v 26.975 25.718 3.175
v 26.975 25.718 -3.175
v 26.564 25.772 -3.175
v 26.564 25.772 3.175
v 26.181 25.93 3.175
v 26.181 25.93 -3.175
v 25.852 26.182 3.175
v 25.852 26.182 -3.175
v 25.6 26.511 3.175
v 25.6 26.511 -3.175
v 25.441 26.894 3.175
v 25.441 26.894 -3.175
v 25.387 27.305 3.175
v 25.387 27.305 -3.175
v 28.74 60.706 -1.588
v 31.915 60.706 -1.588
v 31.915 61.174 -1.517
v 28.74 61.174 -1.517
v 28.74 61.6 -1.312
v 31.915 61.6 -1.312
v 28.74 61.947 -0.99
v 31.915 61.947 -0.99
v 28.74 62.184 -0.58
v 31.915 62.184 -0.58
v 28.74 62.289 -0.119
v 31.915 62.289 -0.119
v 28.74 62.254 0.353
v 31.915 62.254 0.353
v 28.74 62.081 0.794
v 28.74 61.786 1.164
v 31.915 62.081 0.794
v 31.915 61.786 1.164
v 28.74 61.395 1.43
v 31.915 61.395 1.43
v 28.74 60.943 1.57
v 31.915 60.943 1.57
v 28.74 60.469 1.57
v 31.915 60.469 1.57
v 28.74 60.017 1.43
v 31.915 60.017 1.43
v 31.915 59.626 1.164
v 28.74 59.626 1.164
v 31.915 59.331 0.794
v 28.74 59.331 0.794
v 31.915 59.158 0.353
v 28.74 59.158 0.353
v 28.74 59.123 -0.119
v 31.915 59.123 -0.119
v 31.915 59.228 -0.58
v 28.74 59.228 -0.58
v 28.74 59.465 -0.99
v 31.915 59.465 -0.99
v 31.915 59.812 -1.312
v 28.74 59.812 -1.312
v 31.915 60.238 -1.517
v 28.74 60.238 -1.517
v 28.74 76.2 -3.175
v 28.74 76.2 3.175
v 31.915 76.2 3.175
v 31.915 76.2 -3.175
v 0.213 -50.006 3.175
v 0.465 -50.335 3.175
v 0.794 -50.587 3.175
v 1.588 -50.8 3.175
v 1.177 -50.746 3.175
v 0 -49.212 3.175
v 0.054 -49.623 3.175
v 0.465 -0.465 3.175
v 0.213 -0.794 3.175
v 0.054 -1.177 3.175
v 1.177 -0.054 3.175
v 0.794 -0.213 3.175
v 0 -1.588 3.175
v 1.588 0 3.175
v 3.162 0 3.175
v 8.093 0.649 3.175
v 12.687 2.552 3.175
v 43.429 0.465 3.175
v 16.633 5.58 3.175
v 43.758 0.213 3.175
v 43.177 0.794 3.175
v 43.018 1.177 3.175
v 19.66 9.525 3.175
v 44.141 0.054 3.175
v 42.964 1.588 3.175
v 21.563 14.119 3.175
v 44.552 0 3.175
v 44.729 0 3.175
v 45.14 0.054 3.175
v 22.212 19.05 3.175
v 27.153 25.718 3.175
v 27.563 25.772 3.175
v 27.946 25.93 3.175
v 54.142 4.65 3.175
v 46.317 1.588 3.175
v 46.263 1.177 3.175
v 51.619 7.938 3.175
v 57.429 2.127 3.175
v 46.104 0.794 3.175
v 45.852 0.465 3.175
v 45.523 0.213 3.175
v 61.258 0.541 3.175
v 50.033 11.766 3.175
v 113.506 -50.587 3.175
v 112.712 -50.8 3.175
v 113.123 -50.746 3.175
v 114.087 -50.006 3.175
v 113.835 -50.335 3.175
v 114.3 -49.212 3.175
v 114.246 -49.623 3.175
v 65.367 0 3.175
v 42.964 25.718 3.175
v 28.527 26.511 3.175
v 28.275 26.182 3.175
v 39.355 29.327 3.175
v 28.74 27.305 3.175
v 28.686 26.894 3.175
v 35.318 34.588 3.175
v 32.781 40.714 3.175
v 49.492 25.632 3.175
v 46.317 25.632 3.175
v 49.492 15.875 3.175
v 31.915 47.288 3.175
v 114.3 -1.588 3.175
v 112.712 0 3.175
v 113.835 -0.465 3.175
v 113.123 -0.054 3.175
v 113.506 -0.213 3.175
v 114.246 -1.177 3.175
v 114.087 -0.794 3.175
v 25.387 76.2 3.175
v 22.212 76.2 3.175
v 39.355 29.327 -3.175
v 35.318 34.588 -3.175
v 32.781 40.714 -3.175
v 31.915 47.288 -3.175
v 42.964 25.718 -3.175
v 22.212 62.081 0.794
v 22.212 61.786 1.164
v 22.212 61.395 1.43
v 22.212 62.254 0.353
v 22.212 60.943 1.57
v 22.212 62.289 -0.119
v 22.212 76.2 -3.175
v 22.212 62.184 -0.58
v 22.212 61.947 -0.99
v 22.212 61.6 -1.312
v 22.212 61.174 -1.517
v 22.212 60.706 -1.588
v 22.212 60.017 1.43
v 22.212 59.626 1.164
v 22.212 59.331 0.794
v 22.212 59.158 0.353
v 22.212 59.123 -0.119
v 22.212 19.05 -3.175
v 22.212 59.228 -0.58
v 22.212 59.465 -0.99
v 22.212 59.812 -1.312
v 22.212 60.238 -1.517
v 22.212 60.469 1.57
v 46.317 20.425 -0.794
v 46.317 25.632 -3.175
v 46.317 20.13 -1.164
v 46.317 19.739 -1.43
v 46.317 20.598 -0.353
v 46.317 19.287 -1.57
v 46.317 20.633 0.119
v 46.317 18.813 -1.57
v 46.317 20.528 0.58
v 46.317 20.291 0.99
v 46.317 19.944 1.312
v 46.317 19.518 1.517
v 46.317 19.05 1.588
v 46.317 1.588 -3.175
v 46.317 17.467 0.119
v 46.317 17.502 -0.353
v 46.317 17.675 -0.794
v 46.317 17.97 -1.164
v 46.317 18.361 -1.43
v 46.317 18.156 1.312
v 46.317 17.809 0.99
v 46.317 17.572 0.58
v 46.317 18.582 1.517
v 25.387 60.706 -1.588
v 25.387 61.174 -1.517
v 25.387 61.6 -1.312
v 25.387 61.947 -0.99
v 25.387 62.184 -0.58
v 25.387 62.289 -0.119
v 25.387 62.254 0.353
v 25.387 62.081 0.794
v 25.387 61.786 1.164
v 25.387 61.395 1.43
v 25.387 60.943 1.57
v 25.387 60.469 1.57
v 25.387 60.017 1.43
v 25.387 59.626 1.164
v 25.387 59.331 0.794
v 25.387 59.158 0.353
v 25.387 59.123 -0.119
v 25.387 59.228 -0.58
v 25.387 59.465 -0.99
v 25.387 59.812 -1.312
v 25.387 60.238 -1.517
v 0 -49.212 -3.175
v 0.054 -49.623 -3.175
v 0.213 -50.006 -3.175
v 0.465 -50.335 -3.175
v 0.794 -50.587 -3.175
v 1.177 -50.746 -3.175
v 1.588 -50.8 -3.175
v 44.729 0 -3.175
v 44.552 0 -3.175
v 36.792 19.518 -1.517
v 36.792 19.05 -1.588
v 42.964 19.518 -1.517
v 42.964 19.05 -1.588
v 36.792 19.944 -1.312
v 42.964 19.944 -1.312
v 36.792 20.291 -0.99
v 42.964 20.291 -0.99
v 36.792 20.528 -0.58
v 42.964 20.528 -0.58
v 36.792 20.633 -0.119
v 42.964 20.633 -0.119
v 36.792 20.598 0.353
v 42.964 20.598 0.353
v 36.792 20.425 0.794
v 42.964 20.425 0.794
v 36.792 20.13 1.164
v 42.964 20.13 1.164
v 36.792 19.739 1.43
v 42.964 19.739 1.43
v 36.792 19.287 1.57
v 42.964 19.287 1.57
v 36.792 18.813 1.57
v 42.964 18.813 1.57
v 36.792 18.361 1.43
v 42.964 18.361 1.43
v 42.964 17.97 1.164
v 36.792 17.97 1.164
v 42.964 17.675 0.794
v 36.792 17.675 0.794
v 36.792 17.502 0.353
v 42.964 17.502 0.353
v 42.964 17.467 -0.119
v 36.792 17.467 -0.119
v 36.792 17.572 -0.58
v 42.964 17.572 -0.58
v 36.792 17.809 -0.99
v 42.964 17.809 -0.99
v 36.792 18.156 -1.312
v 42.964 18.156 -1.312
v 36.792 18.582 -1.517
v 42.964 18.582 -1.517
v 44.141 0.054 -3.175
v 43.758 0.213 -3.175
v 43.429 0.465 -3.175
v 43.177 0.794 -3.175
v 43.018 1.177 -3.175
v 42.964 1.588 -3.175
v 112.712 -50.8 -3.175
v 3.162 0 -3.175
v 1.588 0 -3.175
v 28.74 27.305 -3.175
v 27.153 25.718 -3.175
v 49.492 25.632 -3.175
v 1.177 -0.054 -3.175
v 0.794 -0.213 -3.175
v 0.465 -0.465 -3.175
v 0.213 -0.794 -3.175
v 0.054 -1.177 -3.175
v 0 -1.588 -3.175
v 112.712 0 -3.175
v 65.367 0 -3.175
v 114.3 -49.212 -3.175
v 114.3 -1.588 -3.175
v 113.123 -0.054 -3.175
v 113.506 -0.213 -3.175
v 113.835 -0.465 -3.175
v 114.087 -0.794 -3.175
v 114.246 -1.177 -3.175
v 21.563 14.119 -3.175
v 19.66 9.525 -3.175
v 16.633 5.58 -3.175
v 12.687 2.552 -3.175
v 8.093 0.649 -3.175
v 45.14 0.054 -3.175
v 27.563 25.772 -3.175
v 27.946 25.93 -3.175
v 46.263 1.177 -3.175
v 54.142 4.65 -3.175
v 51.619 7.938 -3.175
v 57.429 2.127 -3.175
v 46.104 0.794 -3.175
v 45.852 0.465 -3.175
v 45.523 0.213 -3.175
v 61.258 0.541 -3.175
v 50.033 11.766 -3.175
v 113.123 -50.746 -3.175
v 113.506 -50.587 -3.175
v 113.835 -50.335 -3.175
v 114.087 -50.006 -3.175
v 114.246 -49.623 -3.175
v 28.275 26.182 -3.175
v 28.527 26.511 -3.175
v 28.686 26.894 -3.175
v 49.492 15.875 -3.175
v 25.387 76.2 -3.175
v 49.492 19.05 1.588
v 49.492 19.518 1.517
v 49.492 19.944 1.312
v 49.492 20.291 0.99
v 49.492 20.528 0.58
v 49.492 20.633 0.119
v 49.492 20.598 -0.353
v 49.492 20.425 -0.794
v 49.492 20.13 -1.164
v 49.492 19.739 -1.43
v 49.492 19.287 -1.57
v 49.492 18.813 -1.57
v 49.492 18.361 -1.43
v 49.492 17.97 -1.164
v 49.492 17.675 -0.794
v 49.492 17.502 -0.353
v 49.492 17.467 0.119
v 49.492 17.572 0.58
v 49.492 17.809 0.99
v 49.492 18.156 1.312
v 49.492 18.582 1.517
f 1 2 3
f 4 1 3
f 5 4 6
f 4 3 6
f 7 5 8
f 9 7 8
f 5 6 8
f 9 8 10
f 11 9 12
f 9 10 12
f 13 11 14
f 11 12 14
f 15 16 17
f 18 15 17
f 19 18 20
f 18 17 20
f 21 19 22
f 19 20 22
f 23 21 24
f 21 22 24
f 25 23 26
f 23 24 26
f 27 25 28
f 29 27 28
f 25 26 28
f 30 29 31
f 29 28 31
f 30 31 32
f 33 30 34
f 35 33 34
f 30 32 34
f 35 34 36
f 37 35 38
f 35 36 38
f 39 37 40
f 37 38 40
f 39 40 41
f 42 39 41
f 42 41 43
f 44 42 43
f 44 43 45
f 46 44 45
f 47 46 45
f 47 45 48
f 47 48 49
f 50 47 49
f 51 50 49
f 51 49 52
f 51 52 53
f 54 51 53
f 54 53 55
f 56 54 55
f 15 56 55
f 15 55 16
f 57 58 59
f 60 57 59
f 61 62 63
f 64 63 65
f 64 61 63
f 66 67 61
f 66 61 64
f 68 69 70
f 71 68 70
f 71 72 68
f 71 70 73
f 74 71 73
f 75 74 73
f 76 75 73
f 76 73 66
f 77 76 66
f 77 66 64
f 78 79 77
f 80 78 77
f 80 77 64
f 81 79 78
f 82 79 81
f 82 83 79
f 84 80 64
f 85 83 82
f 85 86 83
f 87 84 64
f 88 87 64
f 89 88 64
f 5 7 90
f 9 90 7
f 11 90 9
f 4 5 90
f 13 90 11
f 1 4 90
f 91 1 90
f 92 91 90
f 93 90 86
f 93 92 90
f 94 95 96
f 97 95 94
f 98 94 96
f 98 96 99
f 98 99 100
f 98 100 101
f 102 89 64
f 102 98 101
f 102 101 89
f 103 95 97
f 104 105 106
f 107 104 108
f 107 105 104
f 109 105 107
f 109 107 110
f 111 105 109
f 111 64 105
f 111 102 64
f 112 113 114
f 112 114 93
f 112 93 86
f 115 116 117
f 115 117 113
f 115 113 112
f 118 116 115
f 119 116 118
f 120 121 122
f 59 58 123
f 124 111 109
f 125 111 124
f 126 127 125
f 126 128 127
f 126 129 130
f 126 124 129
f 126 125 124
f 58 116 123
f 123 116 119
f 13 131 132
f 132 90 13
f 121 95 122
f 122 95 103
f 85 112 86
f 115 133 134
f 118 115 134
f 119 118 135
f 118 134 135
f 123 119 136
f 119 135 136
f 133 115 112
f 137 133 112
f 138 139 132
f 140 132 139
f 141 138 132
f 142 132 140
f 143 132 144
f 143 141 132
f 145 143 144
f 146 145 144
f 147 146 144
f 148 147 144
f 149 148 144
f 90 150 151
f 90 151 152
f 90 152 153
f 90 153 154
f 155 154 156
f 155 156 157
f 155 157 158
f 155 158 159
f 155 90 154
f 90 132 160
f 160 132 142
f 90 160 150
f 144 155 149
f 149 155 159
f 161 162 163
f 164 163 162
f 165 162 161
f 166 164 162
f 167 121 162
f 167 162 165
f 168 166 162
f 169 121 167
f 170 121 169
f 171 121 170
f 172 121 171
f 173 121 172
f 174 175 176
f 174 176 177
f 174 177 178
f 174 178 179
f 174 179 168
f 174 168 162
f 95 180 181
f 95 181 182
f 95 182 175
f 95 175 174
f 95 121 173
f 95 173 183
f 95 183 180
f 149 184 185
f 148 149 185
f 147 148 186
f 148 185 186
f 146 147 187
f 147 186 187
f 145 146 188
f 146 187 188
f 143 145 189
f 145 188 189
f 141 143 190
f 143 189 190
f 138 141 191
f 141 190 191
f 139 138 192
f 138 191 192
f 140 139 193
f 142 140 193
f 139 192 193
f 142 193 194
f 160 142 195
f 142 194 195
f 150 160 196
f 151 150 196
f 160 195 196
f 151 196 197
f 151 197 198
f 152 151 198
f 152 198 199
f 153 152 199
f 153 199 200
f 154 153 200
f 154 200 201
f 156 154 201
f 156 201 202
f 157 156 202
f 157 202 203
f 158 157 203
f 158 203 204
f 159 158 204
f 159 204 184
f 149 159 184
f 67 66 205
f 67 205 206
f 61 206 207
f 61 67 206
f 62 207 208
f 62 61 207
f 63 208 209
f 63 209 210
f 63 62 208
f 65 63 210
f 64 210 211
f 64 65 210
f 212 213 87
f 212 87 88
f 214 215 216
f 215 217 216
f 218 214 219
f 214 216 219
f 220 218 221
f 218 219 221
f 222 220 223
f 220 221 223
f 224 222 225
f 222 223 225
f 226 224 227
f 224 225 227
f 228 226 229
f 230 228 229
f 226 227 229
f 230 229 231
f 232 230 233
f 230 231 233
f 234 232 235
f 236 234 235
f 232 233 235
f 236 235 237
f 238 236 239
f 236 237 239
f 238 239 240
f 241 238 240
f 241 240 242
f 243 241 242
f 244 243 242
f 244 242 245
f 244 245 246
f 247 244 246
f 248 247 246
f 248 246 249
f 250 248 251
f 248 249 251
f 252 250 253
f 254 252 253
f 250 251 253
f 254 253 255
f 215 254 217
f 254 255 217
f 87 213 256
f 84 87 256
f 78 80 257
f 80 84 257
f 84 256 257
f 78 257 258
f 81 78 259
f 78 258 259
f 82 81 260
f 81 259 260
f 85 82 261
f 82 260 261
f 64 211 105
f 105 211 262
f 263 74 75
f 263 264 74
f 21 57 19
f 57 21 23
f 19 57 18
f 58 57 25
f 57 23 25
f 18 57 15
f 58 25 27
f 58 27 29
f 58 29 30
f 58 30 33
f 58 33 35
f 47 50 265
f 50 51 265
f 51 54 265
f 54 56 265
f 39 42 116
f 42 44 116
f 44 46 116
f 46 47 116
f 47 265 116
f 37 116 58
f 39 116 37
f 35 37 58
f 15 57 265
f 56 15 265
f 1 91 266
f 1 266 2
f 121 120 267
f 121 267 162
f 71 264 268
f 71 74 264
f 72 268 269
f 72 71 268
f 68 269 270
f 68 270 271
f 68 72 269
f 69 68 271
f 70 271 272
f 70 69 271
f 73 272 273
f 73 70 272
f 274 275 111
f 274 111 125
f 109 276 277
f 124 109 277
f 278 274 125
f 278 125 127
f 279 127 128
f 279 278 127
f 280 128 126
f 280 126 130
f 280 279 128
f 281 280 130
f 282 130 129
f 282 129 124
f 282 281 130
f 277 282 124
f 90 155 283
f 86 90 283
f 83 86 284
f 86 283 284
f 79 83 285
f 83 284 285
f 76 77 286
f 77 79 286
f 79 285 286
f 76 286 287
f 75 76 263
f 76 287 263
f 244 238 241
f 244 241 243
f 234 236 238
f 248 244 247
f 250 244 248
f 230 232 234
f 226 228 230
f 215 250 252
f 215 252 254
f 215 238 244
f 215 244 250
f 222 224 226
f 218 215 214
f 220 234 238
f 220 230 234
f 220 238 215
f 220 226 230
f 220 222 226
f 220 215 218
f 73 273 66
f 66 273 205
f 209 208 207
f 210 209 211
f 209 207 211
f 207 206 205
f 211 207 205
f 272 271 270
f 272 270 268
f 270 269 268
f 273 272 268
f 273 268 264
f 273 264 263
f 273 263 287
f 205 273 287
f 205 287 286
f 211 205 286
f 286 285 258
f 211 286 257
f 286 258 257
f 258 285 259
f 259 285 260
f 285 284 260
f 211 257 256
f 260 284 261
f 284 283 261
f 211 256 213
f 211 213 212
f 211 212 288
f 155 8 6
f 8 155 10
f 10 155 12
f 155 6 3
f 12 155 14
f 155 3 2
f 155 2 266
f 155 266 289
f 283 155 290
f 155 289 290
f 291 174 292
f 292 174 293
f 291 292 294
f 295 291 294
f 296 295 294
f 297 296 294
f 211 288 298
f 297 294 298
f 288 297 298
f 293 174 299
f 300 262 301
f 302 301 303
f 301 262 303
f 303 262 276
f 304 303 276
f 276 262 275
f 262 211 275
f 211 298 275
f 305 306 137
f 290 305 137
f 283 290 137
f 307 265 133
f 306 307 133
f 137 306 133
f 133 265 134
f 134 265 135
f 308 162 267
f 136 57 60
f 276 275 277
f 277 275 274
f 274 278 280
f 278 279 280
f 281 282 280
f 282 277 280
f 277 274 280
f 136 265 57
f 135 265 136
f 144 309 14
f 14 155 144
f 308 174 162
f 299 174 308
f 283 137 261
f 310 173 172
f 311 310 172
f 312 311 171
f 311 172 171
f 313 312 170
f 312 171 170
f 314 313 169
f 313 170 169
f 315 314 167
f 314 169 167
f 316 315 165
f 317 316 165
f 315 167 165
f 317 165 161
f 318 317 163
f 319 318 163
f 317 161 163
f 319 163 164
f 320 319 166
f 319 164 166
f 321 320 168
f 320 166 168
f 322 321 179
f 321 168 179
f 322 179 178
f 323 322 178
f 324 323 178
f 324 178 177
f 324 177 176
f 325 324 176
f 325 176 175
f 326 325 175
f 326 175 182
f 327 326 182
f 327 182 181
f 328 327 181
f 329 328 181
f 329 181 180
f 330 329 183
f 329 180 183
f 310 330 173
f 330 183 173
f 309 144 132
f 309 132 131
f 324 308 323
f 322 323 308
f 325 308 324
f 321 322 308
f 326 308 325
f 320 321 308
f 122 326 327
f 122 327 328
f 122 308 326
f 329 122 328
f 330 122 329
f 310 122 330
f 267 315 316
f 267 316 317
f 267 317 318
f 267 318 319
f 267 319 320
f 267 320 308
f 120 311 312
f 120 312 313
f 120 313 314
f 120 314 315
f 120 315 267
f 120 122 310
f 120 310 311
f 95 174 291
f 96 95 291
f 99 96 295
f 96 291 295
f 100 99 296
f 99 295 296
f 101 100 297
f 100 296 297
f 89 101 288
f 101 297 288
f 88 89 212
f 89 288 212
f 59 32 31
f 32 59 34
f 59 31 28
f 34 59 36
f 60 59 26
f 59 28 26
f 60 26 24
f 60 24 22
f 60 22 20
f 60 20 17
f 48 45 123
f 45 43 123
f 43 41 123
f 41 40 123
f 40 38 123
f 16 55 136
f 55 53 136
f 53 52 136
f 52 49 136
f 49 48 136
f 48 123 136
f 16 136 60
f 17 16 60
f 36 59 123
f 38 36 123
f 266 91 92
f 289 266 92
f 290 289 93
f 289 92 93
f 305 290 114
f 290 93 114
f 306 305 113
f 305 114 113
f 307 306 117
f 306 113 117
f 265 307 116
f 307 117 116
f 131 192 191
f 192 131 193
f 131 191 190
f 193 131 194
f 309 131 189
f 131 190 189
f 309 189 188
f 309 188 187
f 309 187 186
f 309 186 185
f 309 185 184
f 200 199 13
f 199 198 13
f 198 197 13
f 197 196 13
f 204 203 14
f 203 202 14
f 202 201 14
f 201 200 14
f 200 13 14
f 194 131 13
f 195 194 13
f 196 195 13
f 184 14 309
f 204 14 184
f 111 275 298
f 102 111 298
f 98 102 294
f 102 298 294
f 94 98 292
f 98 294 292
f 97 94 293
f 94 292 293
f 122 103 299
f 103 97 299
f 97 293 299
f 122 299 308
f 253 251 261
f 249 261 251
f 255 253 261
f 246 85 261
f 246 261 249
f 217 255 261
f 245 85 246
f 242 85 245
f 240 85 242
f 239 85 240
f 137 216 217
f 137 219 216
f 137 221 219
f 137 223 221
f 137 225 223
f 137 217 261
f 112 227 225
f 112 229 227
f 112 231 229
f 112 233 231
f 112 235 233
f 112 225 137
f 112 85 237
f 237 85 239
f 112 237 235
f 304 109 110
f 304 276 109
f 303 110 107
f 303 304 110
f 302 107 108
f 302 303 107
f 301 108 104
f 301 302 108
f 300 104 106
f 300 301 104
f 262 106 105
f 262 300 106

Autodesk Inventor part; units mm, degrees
ref_plane "YZ Plane" through (0, 0, 0) normal (1, 0, 0) x (0, 1, 0)
ref_plane "XZ Plane" through (0, 0, 0) normal (0, 1, 0) x (-1, 0, 0)
ref_plane "XY Plane" through (0, 0, 0) normal (0, 0, 1) x (1, 0, 0)
sketch "Sketch1" plane through (0, 0, 0) normal (0, 0, 1) x (1, 0, 0)
  line L0 (0, 0) -> (114.3, 0)
  line L1 (0, 0) -> (0, -50.8)
  line L2 (0, -50.8) -> (114.3, -50.8)
  line L3 (114.3, -50.8) -> (114.3, 0)
  dimension "d1" = 114.3
  dimension "d2" = 50.8
  dimension "d3" = 114.3
extrude "Extrusion1" add sketch "Sketch1" along normal blind 3.175
sketch "Sketch2" plane through (0, 0, 0) normal (0, 1, 0) x (1, 0, 0)
  line L0 (114.3, -3.175) -> (0, -3.175) projected
  line L1 (25.3873, -1.5875) -> (25.3873, 0)
  line L2 (25.3873, -3.175) -> (25.3873, -1.5875)
  line L3 (28.7401, -1.5875) -> (28.7401, -3.175)
  line L4 (28.7401, -1.5875) -> (28.7401, 0)
  line L5 (25.3873, -3.175) -> (22.2123, -3.175)
  line L6 (22.2123, -3.175) -> (22.2123, 3.175)
  line L7 (28.7401, -3.175) -> (31.9151, -3.175)
  line L8 (31.9151, -3.175) -> (31.9151, 3.175)
  line L9 (25.3873, 0) -> (25.3873, 3.175)
  line L10 (25.3873, 3.175) -> (22.2123, 3.175)
  line L11 (31.9151, 3.175) -> (28.7401, 3.175)
  line L12 (28.7401, 3.175) -> (28.7401, 0)
  point P0 (27.0637, -1.5875)
  dimension "d7" = 1.6764
  dimension "d8" = 1.6764
  dimension "d9" = 3.175
  dimension "d10" = 6.35
  dimension "d11" = 3.175
sketch "Sketch3" plane through (0, 0, 0) normal (0, 0, -1) x (-1, 0, 0)
  line L0 (-114.3, 0) -> (0, 0) projected
  line L1 (0, -50.8) -> (-114.3, -50.8) projected
  line L2 (0, 0) -> (-114.3, 0)
  line L3 (-114.3, 0) -> (-114.3, -50.8)
  line L4 (-114.3, -50.8) -> (0, -50.8)
  line L5 (0, -50.8) -> (0, 0)
extrude "Extrusion2" add sketch "Sketch3" along normal blind 3.175
extrude "Extrusion3" add sketch "Sketch2" along normal blind 76.2 contours L0 L3 L4 L12 L11 L8
extrude "Extrusion4" add sketch "Sketch2" along normal blind 76.2 contours L0 L6 L10 L9 L1 L2
sketch "Sketch4" plane through (31.9151, 0, 3.175) normal (1, 0, 0) x (0, 0, -1)
  line L0 (3.175, 0) -> (3.175, 19.05)
  circle A0 centre (3.175, 19.05) radius 1.5875
  dimension "d18" = 19.05
  dimension "d19" = 3.175
extrude "Extrusion5" cut sketch "Sketch4" along normal mid plane 50.8
sketch "Sketch5" plane through (31.9151, 0, 3.175) normal (1, 0, 0) x (0, 0, -1)
  circle A0 centre (3.175, 19.05) radius 1.5875 projected
  line L0 (3.175, 19.05) -> (3.175, 60.706)
  circle A1 centre (3.175, 60.706) radius 1.5875
  point P0 (3.175, 0)
  dimension "d22" = 41.656
  dimension "d23" = 3.175
extrude "Extrusion6" cut sketch "Sketch5" against normal blind 50.8 contours A1
sketch "Sketch6" plane through (25.3873, 0, 3.175) normal (1, 0, 0) x (0, 0, -1)
  point P0 (3.175, 0)
sketch "Sketch7" plane through (0, 0, 3.175) normal (0, 0, 1) x (1, 0, 0)
  point P0 (0, 0)
sketch "Sketch8" plane through (0, 0, 3.175) normal (0, 0, 1) x (1, 0, 0)
  line L0 (38.0873, 0) -> (41.2623, 0)
  line L1 (41.2623, 0) -> (41.2623, 22.5425)
  line L2 (38.0873, 0) -> (38.0873, 22.5425)
  line L3 (38.0873, 22.5425) -> (41.2623, 22.5425)
  line L4 (38.0873, 22.5425) -> (31.9151, 22.5425)
  line L5 (31.9151, 0) -> (31.9151, 76.2) projected
  line L6 (41.2623, 22.5425) -> (41.2623, 25.7175)
  line L7 (41.2623, 25.7175) -> (31.9151, 25.7175)
  point P0 (0, 0)
  dimension "d30" = 3.175
  dimension "d34" = 3.175
sketch "Sketch9" plane through (0, 0, 3.175) normal (0, 0, 1) x (1, 0, 0)
  line L0 (41.2623, 25.7175) -> (41.2623, 0) projected
  line L1 (31.9151, 0) -> (114.3, 0) projected
  line L2 (44.6151, 0) -> (44.6151, 25.6324)
  line L3 (44.6151, 25.6324) -> (47.7901, 25.6324)
  line L4 (47.7901, 0) -> (47.7901, 25.6324)
  line L5 (44.6151, 0) -> (47.7901, 0)
  point P0 (0, 0)
  dimension "d35" = 3.3528
  dimension "d36" = 3.175
sketch "Sketch12" plane through (0, 0, 3.175) normal (0, 0, 1) x (1, 0, 0)
  line L0 (44.6151, 0) -> (44.6151, 25.6324) projected
  line L1 (44.6151, 0) -> (46.3169, 0)
  line L2 (46.3169, 0) -> (49.4919, 0)
  line L3 (25.3873, 0) -> (114.3, 0) projected
  line L4 (49.4919, 0) -> (49.4919, 25.6324)
  line L5 (49.4919, 25.6324) -> (46.3169, 25.6324)
  line L6 (46.3169, 25.6324) -> (46.3169, 0)
  point P0 (0, 0)
  point P1 (47.7901, 0)
  point P2 (41.2623, 0)
  dimension "d44" = 1.7018
  dimension "d45" = 3.175
extrude "Extrusion11" add sketch "Sketch12" against normal blind 6.35
sketch "Sketch13" plane through (0, 0, 3.175) normal (0, 0, 1) x (1, 0, 0)
  line L0 (38.0873, 22.5425) -> (38.0873, 0) projected
  line L1 (38.0873, 0) -> (39.7891, 0)
  line L2 (39.7891, 0) -> (42.9641, 0)
  line L3 (46.3169, 0) -> (31.9151, 0) projected
  line L4 (39.7891, 0) -> (39.7891, 25.7175)
  line L5 (41.2623, 25.7175) -> (31.9151, 25.7175) projected
  line L6 (42.9641, 0) -> (42.9641, 25.7175)
  line L7 (42.9641, 25.7175) -> (39.7891, 25.7175)
  point P0 (0, 0)
  point P1 (41.2623, 0)
  dimension "d48" = 1.7018
  dimension "d49" = 3.175
extrude "Extrusion12" add sketch "Sketch13" against normal blind 6.35
sketch "Sketch14" plane through (0, 0, 3.175) normal (0, 0, 1) x (1, 0, 0)
  line L0 (39.7891, 25.7175) -> (42.9641, 25.7175) projected
  line L1 (39.7891, 25.7175) -> (39.7891, 22.5425)
  line L2 (39.7891, 25.7175) -> (39.7891, 0) projected
  line L3 (39.7891, 22.5425) -> (31.9151, 22.5425)
  line L4 (39.7891, 25.7175) -> (50.9246, 25.7175) construction
  line L5 (42.9641, 25.7175) -> (56.7757, 25.7175) construction
  line L6 (31.9151, 0) -> (31.9151, 76.2) projected
  line L7 (31.9151, 36.7665) -> (42.9641, 25.7175)
  line L8 (31.9151, 36.7665) -> (31.9151, 22.5425)
  line L9 (42.9641, 25.7175) -> (39.7891, 25.7175) projected
  line L10 (39.7891, 25.7175) -> (42.9641, 25.7175)
  point P0 (0, 0)
  dimension "d52" = 3.175
extrude "Extrusion13" add sketch "Sketch14" against normal blind 6.35
sketch "Sketch15" plane through (22.2123, 0, -3.175) normal (-1, 0, 0) x (0, 0, 1)
  circle A0 centre (3.175, 19.05) radius 1.5875 projected
  circle A1 centre (3.175, 19.05) radius 1.5875
  point P0 (3.175, 0)
extrude "Extrusion14" cut sketch "Sketch15" against normal blind 50.8
sketch "Sketch16" plane through (0, 0, 3.175) normal (0, 0, 1) x (1, 0, 0)
  line L0 (31.9151, 36.7665) -> (42.9641, 25.7175) projected
  line L1 (42.9641, 25.7175) -> (22.2123, 25.7175)
  line L2 (22.2123, 0) -> (22.2123, 76.2) projected
  line L3 (42.9641, 25.7175) -> (42.9641, 0) projected
  line L4 (42.9641, 0) -> (22.2123, 0)
  line L5 (22.2123, 0) -> (22.2123, 25.7175)
  line L6 (42.9641, 25.7175) -> (42.9641, 0)
  point P0 (0, 0)
extrude "Extrusion15" add sketch "Sketch16" against normal blind 6.35
sketch "Sketch17" plane through (49.4919, 0, 3.175) normal (1, 0, 0) x (0, 0, -1)
  circle A0 centre (3.175, 19.05) radius 1.5875 projected
  circle A1 centre (3.175, 19.05) radius 1.5875
  point P0 (3.175, 0)
extrude "Extrusion16" cut sketch "Sketch17" against normal blind 12.7
fillet "Fillet1" radius 1.5875 2 edges at (42.9641, 0, 0) (46.3169, 0, 0)
fillet "Fillet3" radius 25.4 1 edges at (31.9151, 36.7665, 0)
fillet "Fillet4" radius 1.5875 6 edges at (0, 0, 0) (0, -50.8, 0) (114.3, -50.8, 0) (114.3, 0, 0) (25.3873, 25.7175, 0) (28.7401, 25.7175, 0)
fillet "Fillet5" radius 15.875 1 edges at (49.4919, 0, 0)
fillet "Fillet6" radius 19.05 1 edges at (22.2123, 0, 0)
properties part number "2BarClawPaddle" material "Aluminum 6061"
